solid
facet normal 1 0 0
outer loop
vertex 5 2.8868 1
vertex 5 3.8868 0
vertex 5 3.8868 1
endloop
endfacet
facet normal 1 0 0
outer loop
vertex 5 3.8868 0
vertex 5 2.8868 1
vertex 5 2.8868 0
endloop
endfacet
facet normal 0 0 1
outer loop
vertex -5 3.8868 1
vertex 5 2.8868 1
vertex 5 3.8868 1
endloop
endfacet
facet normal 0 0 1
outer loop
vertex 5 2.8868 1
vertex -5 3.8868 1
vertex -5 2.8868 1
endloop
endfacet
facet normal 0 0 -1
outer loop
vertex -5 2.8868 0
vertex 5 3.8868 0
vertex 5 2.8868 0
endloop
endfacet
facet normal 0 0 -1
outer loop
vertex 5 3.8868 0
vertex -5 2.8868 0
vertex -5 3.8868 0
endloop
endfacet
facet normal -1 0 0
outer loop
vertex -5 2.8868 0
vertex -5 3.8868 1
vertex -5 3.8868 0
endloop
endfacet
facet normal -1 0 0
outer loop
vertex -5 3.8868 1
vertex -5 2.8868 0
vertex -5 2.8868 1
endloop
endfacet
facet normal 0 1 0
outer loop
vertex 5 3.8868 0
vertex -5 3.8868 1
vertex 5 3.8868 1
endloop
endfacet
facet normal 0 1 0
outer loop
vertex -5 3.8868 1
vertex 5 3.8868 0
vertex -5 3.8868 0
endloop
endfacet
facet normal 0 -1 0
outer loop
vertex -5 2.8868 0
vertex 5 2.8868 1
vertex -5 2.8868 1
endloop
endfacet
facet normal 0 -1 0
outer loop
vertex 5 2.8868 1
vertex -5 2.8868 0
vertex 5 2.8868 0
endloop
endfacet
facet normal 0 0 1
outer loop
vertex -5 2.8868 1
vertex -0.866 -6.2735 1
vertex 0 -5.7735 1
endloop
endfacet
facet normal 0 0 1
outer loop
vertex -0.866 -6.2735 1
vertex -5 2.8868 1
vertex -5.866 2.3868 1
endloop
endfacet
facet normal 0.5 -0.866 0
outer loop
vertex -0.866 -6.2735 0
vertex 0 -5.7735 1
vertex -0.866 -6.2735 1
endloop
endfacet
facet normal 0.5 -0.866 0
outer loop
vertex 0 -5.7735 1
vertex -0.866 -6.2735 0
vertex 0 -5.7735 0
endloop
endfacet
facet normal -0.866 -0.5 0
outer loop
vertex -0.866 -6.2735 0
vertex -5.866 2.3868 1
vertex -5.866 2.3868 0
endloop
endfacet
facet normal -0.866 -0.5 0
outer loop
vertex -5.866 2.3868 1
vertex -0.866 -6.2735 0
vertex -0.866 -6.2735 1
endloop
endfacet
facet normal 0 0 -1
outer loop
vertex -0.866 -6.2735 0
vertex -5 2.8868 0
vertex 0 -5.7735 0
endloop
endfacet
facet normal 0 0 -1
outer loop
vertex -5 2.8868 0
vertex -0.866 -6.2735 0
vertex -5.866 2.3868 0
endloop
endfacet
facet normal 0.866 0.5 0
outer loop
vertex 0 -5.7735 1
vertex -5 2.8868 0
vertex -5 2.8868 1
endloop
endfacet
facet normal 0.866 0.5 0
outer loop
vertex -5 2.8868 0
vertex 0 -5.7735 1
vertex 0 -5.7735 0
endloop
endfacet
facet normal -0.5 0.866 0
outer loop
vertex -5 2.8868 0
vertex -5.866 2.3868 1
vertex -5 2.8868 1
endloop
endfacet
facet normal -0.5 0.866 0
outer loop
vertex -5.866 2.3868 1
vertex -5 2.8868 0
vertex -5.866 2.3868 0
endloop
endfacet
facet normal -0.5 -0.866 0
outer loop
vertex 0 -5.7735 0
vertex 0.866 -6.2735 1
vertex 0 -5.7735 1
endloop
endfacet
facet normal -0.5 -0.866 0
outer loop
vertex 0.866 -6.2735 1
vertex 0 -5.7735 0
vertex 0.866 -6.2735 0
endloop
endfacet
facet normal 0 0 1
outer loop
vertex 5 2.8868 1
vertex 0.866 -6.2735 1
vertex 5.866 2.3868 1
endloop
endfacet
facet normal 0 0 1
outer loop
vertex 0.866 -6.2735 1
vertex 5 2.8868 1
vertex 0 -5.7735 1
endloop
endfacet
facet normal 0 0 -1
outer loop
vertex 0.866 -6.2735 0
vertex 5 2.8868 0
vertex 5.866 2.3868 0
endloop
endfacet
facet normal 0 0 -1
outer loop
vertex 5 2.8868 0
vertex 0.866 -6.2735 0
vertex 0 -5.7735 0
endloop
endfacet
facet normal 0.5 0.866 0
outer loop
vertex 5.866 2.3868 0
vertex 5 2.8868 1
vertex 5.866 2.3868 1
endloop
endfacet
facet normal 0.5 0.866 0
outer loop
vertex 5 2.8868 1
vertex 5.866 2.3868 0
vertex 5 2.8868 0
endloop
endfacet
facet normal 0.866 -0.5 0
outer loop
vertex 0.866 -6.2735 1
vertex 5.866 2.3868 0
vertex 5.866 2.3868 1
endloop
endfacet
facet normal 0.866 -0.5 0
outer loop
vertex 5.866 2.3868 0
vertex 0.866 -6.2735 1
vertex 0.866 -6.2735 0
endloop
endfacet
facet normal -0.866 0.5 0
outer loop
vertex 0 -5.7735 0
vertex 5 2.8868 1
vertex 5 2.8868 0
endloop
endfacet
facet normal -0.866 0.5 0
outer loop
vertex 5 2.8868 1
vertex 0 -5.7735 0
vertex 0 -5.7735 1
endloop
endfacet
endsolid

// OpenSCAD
sides = 3;
length = 10;

apothem = length / (2 * tan(180/sides));

echo(apothem);

for (i = [0:sides-1]) {
    rotate([0, 0, 360 / sides * i])
     translate([0, apothem, 0])
      translate([-length*.5, 0, 0])
       cube([length, 1, 1]);
}
